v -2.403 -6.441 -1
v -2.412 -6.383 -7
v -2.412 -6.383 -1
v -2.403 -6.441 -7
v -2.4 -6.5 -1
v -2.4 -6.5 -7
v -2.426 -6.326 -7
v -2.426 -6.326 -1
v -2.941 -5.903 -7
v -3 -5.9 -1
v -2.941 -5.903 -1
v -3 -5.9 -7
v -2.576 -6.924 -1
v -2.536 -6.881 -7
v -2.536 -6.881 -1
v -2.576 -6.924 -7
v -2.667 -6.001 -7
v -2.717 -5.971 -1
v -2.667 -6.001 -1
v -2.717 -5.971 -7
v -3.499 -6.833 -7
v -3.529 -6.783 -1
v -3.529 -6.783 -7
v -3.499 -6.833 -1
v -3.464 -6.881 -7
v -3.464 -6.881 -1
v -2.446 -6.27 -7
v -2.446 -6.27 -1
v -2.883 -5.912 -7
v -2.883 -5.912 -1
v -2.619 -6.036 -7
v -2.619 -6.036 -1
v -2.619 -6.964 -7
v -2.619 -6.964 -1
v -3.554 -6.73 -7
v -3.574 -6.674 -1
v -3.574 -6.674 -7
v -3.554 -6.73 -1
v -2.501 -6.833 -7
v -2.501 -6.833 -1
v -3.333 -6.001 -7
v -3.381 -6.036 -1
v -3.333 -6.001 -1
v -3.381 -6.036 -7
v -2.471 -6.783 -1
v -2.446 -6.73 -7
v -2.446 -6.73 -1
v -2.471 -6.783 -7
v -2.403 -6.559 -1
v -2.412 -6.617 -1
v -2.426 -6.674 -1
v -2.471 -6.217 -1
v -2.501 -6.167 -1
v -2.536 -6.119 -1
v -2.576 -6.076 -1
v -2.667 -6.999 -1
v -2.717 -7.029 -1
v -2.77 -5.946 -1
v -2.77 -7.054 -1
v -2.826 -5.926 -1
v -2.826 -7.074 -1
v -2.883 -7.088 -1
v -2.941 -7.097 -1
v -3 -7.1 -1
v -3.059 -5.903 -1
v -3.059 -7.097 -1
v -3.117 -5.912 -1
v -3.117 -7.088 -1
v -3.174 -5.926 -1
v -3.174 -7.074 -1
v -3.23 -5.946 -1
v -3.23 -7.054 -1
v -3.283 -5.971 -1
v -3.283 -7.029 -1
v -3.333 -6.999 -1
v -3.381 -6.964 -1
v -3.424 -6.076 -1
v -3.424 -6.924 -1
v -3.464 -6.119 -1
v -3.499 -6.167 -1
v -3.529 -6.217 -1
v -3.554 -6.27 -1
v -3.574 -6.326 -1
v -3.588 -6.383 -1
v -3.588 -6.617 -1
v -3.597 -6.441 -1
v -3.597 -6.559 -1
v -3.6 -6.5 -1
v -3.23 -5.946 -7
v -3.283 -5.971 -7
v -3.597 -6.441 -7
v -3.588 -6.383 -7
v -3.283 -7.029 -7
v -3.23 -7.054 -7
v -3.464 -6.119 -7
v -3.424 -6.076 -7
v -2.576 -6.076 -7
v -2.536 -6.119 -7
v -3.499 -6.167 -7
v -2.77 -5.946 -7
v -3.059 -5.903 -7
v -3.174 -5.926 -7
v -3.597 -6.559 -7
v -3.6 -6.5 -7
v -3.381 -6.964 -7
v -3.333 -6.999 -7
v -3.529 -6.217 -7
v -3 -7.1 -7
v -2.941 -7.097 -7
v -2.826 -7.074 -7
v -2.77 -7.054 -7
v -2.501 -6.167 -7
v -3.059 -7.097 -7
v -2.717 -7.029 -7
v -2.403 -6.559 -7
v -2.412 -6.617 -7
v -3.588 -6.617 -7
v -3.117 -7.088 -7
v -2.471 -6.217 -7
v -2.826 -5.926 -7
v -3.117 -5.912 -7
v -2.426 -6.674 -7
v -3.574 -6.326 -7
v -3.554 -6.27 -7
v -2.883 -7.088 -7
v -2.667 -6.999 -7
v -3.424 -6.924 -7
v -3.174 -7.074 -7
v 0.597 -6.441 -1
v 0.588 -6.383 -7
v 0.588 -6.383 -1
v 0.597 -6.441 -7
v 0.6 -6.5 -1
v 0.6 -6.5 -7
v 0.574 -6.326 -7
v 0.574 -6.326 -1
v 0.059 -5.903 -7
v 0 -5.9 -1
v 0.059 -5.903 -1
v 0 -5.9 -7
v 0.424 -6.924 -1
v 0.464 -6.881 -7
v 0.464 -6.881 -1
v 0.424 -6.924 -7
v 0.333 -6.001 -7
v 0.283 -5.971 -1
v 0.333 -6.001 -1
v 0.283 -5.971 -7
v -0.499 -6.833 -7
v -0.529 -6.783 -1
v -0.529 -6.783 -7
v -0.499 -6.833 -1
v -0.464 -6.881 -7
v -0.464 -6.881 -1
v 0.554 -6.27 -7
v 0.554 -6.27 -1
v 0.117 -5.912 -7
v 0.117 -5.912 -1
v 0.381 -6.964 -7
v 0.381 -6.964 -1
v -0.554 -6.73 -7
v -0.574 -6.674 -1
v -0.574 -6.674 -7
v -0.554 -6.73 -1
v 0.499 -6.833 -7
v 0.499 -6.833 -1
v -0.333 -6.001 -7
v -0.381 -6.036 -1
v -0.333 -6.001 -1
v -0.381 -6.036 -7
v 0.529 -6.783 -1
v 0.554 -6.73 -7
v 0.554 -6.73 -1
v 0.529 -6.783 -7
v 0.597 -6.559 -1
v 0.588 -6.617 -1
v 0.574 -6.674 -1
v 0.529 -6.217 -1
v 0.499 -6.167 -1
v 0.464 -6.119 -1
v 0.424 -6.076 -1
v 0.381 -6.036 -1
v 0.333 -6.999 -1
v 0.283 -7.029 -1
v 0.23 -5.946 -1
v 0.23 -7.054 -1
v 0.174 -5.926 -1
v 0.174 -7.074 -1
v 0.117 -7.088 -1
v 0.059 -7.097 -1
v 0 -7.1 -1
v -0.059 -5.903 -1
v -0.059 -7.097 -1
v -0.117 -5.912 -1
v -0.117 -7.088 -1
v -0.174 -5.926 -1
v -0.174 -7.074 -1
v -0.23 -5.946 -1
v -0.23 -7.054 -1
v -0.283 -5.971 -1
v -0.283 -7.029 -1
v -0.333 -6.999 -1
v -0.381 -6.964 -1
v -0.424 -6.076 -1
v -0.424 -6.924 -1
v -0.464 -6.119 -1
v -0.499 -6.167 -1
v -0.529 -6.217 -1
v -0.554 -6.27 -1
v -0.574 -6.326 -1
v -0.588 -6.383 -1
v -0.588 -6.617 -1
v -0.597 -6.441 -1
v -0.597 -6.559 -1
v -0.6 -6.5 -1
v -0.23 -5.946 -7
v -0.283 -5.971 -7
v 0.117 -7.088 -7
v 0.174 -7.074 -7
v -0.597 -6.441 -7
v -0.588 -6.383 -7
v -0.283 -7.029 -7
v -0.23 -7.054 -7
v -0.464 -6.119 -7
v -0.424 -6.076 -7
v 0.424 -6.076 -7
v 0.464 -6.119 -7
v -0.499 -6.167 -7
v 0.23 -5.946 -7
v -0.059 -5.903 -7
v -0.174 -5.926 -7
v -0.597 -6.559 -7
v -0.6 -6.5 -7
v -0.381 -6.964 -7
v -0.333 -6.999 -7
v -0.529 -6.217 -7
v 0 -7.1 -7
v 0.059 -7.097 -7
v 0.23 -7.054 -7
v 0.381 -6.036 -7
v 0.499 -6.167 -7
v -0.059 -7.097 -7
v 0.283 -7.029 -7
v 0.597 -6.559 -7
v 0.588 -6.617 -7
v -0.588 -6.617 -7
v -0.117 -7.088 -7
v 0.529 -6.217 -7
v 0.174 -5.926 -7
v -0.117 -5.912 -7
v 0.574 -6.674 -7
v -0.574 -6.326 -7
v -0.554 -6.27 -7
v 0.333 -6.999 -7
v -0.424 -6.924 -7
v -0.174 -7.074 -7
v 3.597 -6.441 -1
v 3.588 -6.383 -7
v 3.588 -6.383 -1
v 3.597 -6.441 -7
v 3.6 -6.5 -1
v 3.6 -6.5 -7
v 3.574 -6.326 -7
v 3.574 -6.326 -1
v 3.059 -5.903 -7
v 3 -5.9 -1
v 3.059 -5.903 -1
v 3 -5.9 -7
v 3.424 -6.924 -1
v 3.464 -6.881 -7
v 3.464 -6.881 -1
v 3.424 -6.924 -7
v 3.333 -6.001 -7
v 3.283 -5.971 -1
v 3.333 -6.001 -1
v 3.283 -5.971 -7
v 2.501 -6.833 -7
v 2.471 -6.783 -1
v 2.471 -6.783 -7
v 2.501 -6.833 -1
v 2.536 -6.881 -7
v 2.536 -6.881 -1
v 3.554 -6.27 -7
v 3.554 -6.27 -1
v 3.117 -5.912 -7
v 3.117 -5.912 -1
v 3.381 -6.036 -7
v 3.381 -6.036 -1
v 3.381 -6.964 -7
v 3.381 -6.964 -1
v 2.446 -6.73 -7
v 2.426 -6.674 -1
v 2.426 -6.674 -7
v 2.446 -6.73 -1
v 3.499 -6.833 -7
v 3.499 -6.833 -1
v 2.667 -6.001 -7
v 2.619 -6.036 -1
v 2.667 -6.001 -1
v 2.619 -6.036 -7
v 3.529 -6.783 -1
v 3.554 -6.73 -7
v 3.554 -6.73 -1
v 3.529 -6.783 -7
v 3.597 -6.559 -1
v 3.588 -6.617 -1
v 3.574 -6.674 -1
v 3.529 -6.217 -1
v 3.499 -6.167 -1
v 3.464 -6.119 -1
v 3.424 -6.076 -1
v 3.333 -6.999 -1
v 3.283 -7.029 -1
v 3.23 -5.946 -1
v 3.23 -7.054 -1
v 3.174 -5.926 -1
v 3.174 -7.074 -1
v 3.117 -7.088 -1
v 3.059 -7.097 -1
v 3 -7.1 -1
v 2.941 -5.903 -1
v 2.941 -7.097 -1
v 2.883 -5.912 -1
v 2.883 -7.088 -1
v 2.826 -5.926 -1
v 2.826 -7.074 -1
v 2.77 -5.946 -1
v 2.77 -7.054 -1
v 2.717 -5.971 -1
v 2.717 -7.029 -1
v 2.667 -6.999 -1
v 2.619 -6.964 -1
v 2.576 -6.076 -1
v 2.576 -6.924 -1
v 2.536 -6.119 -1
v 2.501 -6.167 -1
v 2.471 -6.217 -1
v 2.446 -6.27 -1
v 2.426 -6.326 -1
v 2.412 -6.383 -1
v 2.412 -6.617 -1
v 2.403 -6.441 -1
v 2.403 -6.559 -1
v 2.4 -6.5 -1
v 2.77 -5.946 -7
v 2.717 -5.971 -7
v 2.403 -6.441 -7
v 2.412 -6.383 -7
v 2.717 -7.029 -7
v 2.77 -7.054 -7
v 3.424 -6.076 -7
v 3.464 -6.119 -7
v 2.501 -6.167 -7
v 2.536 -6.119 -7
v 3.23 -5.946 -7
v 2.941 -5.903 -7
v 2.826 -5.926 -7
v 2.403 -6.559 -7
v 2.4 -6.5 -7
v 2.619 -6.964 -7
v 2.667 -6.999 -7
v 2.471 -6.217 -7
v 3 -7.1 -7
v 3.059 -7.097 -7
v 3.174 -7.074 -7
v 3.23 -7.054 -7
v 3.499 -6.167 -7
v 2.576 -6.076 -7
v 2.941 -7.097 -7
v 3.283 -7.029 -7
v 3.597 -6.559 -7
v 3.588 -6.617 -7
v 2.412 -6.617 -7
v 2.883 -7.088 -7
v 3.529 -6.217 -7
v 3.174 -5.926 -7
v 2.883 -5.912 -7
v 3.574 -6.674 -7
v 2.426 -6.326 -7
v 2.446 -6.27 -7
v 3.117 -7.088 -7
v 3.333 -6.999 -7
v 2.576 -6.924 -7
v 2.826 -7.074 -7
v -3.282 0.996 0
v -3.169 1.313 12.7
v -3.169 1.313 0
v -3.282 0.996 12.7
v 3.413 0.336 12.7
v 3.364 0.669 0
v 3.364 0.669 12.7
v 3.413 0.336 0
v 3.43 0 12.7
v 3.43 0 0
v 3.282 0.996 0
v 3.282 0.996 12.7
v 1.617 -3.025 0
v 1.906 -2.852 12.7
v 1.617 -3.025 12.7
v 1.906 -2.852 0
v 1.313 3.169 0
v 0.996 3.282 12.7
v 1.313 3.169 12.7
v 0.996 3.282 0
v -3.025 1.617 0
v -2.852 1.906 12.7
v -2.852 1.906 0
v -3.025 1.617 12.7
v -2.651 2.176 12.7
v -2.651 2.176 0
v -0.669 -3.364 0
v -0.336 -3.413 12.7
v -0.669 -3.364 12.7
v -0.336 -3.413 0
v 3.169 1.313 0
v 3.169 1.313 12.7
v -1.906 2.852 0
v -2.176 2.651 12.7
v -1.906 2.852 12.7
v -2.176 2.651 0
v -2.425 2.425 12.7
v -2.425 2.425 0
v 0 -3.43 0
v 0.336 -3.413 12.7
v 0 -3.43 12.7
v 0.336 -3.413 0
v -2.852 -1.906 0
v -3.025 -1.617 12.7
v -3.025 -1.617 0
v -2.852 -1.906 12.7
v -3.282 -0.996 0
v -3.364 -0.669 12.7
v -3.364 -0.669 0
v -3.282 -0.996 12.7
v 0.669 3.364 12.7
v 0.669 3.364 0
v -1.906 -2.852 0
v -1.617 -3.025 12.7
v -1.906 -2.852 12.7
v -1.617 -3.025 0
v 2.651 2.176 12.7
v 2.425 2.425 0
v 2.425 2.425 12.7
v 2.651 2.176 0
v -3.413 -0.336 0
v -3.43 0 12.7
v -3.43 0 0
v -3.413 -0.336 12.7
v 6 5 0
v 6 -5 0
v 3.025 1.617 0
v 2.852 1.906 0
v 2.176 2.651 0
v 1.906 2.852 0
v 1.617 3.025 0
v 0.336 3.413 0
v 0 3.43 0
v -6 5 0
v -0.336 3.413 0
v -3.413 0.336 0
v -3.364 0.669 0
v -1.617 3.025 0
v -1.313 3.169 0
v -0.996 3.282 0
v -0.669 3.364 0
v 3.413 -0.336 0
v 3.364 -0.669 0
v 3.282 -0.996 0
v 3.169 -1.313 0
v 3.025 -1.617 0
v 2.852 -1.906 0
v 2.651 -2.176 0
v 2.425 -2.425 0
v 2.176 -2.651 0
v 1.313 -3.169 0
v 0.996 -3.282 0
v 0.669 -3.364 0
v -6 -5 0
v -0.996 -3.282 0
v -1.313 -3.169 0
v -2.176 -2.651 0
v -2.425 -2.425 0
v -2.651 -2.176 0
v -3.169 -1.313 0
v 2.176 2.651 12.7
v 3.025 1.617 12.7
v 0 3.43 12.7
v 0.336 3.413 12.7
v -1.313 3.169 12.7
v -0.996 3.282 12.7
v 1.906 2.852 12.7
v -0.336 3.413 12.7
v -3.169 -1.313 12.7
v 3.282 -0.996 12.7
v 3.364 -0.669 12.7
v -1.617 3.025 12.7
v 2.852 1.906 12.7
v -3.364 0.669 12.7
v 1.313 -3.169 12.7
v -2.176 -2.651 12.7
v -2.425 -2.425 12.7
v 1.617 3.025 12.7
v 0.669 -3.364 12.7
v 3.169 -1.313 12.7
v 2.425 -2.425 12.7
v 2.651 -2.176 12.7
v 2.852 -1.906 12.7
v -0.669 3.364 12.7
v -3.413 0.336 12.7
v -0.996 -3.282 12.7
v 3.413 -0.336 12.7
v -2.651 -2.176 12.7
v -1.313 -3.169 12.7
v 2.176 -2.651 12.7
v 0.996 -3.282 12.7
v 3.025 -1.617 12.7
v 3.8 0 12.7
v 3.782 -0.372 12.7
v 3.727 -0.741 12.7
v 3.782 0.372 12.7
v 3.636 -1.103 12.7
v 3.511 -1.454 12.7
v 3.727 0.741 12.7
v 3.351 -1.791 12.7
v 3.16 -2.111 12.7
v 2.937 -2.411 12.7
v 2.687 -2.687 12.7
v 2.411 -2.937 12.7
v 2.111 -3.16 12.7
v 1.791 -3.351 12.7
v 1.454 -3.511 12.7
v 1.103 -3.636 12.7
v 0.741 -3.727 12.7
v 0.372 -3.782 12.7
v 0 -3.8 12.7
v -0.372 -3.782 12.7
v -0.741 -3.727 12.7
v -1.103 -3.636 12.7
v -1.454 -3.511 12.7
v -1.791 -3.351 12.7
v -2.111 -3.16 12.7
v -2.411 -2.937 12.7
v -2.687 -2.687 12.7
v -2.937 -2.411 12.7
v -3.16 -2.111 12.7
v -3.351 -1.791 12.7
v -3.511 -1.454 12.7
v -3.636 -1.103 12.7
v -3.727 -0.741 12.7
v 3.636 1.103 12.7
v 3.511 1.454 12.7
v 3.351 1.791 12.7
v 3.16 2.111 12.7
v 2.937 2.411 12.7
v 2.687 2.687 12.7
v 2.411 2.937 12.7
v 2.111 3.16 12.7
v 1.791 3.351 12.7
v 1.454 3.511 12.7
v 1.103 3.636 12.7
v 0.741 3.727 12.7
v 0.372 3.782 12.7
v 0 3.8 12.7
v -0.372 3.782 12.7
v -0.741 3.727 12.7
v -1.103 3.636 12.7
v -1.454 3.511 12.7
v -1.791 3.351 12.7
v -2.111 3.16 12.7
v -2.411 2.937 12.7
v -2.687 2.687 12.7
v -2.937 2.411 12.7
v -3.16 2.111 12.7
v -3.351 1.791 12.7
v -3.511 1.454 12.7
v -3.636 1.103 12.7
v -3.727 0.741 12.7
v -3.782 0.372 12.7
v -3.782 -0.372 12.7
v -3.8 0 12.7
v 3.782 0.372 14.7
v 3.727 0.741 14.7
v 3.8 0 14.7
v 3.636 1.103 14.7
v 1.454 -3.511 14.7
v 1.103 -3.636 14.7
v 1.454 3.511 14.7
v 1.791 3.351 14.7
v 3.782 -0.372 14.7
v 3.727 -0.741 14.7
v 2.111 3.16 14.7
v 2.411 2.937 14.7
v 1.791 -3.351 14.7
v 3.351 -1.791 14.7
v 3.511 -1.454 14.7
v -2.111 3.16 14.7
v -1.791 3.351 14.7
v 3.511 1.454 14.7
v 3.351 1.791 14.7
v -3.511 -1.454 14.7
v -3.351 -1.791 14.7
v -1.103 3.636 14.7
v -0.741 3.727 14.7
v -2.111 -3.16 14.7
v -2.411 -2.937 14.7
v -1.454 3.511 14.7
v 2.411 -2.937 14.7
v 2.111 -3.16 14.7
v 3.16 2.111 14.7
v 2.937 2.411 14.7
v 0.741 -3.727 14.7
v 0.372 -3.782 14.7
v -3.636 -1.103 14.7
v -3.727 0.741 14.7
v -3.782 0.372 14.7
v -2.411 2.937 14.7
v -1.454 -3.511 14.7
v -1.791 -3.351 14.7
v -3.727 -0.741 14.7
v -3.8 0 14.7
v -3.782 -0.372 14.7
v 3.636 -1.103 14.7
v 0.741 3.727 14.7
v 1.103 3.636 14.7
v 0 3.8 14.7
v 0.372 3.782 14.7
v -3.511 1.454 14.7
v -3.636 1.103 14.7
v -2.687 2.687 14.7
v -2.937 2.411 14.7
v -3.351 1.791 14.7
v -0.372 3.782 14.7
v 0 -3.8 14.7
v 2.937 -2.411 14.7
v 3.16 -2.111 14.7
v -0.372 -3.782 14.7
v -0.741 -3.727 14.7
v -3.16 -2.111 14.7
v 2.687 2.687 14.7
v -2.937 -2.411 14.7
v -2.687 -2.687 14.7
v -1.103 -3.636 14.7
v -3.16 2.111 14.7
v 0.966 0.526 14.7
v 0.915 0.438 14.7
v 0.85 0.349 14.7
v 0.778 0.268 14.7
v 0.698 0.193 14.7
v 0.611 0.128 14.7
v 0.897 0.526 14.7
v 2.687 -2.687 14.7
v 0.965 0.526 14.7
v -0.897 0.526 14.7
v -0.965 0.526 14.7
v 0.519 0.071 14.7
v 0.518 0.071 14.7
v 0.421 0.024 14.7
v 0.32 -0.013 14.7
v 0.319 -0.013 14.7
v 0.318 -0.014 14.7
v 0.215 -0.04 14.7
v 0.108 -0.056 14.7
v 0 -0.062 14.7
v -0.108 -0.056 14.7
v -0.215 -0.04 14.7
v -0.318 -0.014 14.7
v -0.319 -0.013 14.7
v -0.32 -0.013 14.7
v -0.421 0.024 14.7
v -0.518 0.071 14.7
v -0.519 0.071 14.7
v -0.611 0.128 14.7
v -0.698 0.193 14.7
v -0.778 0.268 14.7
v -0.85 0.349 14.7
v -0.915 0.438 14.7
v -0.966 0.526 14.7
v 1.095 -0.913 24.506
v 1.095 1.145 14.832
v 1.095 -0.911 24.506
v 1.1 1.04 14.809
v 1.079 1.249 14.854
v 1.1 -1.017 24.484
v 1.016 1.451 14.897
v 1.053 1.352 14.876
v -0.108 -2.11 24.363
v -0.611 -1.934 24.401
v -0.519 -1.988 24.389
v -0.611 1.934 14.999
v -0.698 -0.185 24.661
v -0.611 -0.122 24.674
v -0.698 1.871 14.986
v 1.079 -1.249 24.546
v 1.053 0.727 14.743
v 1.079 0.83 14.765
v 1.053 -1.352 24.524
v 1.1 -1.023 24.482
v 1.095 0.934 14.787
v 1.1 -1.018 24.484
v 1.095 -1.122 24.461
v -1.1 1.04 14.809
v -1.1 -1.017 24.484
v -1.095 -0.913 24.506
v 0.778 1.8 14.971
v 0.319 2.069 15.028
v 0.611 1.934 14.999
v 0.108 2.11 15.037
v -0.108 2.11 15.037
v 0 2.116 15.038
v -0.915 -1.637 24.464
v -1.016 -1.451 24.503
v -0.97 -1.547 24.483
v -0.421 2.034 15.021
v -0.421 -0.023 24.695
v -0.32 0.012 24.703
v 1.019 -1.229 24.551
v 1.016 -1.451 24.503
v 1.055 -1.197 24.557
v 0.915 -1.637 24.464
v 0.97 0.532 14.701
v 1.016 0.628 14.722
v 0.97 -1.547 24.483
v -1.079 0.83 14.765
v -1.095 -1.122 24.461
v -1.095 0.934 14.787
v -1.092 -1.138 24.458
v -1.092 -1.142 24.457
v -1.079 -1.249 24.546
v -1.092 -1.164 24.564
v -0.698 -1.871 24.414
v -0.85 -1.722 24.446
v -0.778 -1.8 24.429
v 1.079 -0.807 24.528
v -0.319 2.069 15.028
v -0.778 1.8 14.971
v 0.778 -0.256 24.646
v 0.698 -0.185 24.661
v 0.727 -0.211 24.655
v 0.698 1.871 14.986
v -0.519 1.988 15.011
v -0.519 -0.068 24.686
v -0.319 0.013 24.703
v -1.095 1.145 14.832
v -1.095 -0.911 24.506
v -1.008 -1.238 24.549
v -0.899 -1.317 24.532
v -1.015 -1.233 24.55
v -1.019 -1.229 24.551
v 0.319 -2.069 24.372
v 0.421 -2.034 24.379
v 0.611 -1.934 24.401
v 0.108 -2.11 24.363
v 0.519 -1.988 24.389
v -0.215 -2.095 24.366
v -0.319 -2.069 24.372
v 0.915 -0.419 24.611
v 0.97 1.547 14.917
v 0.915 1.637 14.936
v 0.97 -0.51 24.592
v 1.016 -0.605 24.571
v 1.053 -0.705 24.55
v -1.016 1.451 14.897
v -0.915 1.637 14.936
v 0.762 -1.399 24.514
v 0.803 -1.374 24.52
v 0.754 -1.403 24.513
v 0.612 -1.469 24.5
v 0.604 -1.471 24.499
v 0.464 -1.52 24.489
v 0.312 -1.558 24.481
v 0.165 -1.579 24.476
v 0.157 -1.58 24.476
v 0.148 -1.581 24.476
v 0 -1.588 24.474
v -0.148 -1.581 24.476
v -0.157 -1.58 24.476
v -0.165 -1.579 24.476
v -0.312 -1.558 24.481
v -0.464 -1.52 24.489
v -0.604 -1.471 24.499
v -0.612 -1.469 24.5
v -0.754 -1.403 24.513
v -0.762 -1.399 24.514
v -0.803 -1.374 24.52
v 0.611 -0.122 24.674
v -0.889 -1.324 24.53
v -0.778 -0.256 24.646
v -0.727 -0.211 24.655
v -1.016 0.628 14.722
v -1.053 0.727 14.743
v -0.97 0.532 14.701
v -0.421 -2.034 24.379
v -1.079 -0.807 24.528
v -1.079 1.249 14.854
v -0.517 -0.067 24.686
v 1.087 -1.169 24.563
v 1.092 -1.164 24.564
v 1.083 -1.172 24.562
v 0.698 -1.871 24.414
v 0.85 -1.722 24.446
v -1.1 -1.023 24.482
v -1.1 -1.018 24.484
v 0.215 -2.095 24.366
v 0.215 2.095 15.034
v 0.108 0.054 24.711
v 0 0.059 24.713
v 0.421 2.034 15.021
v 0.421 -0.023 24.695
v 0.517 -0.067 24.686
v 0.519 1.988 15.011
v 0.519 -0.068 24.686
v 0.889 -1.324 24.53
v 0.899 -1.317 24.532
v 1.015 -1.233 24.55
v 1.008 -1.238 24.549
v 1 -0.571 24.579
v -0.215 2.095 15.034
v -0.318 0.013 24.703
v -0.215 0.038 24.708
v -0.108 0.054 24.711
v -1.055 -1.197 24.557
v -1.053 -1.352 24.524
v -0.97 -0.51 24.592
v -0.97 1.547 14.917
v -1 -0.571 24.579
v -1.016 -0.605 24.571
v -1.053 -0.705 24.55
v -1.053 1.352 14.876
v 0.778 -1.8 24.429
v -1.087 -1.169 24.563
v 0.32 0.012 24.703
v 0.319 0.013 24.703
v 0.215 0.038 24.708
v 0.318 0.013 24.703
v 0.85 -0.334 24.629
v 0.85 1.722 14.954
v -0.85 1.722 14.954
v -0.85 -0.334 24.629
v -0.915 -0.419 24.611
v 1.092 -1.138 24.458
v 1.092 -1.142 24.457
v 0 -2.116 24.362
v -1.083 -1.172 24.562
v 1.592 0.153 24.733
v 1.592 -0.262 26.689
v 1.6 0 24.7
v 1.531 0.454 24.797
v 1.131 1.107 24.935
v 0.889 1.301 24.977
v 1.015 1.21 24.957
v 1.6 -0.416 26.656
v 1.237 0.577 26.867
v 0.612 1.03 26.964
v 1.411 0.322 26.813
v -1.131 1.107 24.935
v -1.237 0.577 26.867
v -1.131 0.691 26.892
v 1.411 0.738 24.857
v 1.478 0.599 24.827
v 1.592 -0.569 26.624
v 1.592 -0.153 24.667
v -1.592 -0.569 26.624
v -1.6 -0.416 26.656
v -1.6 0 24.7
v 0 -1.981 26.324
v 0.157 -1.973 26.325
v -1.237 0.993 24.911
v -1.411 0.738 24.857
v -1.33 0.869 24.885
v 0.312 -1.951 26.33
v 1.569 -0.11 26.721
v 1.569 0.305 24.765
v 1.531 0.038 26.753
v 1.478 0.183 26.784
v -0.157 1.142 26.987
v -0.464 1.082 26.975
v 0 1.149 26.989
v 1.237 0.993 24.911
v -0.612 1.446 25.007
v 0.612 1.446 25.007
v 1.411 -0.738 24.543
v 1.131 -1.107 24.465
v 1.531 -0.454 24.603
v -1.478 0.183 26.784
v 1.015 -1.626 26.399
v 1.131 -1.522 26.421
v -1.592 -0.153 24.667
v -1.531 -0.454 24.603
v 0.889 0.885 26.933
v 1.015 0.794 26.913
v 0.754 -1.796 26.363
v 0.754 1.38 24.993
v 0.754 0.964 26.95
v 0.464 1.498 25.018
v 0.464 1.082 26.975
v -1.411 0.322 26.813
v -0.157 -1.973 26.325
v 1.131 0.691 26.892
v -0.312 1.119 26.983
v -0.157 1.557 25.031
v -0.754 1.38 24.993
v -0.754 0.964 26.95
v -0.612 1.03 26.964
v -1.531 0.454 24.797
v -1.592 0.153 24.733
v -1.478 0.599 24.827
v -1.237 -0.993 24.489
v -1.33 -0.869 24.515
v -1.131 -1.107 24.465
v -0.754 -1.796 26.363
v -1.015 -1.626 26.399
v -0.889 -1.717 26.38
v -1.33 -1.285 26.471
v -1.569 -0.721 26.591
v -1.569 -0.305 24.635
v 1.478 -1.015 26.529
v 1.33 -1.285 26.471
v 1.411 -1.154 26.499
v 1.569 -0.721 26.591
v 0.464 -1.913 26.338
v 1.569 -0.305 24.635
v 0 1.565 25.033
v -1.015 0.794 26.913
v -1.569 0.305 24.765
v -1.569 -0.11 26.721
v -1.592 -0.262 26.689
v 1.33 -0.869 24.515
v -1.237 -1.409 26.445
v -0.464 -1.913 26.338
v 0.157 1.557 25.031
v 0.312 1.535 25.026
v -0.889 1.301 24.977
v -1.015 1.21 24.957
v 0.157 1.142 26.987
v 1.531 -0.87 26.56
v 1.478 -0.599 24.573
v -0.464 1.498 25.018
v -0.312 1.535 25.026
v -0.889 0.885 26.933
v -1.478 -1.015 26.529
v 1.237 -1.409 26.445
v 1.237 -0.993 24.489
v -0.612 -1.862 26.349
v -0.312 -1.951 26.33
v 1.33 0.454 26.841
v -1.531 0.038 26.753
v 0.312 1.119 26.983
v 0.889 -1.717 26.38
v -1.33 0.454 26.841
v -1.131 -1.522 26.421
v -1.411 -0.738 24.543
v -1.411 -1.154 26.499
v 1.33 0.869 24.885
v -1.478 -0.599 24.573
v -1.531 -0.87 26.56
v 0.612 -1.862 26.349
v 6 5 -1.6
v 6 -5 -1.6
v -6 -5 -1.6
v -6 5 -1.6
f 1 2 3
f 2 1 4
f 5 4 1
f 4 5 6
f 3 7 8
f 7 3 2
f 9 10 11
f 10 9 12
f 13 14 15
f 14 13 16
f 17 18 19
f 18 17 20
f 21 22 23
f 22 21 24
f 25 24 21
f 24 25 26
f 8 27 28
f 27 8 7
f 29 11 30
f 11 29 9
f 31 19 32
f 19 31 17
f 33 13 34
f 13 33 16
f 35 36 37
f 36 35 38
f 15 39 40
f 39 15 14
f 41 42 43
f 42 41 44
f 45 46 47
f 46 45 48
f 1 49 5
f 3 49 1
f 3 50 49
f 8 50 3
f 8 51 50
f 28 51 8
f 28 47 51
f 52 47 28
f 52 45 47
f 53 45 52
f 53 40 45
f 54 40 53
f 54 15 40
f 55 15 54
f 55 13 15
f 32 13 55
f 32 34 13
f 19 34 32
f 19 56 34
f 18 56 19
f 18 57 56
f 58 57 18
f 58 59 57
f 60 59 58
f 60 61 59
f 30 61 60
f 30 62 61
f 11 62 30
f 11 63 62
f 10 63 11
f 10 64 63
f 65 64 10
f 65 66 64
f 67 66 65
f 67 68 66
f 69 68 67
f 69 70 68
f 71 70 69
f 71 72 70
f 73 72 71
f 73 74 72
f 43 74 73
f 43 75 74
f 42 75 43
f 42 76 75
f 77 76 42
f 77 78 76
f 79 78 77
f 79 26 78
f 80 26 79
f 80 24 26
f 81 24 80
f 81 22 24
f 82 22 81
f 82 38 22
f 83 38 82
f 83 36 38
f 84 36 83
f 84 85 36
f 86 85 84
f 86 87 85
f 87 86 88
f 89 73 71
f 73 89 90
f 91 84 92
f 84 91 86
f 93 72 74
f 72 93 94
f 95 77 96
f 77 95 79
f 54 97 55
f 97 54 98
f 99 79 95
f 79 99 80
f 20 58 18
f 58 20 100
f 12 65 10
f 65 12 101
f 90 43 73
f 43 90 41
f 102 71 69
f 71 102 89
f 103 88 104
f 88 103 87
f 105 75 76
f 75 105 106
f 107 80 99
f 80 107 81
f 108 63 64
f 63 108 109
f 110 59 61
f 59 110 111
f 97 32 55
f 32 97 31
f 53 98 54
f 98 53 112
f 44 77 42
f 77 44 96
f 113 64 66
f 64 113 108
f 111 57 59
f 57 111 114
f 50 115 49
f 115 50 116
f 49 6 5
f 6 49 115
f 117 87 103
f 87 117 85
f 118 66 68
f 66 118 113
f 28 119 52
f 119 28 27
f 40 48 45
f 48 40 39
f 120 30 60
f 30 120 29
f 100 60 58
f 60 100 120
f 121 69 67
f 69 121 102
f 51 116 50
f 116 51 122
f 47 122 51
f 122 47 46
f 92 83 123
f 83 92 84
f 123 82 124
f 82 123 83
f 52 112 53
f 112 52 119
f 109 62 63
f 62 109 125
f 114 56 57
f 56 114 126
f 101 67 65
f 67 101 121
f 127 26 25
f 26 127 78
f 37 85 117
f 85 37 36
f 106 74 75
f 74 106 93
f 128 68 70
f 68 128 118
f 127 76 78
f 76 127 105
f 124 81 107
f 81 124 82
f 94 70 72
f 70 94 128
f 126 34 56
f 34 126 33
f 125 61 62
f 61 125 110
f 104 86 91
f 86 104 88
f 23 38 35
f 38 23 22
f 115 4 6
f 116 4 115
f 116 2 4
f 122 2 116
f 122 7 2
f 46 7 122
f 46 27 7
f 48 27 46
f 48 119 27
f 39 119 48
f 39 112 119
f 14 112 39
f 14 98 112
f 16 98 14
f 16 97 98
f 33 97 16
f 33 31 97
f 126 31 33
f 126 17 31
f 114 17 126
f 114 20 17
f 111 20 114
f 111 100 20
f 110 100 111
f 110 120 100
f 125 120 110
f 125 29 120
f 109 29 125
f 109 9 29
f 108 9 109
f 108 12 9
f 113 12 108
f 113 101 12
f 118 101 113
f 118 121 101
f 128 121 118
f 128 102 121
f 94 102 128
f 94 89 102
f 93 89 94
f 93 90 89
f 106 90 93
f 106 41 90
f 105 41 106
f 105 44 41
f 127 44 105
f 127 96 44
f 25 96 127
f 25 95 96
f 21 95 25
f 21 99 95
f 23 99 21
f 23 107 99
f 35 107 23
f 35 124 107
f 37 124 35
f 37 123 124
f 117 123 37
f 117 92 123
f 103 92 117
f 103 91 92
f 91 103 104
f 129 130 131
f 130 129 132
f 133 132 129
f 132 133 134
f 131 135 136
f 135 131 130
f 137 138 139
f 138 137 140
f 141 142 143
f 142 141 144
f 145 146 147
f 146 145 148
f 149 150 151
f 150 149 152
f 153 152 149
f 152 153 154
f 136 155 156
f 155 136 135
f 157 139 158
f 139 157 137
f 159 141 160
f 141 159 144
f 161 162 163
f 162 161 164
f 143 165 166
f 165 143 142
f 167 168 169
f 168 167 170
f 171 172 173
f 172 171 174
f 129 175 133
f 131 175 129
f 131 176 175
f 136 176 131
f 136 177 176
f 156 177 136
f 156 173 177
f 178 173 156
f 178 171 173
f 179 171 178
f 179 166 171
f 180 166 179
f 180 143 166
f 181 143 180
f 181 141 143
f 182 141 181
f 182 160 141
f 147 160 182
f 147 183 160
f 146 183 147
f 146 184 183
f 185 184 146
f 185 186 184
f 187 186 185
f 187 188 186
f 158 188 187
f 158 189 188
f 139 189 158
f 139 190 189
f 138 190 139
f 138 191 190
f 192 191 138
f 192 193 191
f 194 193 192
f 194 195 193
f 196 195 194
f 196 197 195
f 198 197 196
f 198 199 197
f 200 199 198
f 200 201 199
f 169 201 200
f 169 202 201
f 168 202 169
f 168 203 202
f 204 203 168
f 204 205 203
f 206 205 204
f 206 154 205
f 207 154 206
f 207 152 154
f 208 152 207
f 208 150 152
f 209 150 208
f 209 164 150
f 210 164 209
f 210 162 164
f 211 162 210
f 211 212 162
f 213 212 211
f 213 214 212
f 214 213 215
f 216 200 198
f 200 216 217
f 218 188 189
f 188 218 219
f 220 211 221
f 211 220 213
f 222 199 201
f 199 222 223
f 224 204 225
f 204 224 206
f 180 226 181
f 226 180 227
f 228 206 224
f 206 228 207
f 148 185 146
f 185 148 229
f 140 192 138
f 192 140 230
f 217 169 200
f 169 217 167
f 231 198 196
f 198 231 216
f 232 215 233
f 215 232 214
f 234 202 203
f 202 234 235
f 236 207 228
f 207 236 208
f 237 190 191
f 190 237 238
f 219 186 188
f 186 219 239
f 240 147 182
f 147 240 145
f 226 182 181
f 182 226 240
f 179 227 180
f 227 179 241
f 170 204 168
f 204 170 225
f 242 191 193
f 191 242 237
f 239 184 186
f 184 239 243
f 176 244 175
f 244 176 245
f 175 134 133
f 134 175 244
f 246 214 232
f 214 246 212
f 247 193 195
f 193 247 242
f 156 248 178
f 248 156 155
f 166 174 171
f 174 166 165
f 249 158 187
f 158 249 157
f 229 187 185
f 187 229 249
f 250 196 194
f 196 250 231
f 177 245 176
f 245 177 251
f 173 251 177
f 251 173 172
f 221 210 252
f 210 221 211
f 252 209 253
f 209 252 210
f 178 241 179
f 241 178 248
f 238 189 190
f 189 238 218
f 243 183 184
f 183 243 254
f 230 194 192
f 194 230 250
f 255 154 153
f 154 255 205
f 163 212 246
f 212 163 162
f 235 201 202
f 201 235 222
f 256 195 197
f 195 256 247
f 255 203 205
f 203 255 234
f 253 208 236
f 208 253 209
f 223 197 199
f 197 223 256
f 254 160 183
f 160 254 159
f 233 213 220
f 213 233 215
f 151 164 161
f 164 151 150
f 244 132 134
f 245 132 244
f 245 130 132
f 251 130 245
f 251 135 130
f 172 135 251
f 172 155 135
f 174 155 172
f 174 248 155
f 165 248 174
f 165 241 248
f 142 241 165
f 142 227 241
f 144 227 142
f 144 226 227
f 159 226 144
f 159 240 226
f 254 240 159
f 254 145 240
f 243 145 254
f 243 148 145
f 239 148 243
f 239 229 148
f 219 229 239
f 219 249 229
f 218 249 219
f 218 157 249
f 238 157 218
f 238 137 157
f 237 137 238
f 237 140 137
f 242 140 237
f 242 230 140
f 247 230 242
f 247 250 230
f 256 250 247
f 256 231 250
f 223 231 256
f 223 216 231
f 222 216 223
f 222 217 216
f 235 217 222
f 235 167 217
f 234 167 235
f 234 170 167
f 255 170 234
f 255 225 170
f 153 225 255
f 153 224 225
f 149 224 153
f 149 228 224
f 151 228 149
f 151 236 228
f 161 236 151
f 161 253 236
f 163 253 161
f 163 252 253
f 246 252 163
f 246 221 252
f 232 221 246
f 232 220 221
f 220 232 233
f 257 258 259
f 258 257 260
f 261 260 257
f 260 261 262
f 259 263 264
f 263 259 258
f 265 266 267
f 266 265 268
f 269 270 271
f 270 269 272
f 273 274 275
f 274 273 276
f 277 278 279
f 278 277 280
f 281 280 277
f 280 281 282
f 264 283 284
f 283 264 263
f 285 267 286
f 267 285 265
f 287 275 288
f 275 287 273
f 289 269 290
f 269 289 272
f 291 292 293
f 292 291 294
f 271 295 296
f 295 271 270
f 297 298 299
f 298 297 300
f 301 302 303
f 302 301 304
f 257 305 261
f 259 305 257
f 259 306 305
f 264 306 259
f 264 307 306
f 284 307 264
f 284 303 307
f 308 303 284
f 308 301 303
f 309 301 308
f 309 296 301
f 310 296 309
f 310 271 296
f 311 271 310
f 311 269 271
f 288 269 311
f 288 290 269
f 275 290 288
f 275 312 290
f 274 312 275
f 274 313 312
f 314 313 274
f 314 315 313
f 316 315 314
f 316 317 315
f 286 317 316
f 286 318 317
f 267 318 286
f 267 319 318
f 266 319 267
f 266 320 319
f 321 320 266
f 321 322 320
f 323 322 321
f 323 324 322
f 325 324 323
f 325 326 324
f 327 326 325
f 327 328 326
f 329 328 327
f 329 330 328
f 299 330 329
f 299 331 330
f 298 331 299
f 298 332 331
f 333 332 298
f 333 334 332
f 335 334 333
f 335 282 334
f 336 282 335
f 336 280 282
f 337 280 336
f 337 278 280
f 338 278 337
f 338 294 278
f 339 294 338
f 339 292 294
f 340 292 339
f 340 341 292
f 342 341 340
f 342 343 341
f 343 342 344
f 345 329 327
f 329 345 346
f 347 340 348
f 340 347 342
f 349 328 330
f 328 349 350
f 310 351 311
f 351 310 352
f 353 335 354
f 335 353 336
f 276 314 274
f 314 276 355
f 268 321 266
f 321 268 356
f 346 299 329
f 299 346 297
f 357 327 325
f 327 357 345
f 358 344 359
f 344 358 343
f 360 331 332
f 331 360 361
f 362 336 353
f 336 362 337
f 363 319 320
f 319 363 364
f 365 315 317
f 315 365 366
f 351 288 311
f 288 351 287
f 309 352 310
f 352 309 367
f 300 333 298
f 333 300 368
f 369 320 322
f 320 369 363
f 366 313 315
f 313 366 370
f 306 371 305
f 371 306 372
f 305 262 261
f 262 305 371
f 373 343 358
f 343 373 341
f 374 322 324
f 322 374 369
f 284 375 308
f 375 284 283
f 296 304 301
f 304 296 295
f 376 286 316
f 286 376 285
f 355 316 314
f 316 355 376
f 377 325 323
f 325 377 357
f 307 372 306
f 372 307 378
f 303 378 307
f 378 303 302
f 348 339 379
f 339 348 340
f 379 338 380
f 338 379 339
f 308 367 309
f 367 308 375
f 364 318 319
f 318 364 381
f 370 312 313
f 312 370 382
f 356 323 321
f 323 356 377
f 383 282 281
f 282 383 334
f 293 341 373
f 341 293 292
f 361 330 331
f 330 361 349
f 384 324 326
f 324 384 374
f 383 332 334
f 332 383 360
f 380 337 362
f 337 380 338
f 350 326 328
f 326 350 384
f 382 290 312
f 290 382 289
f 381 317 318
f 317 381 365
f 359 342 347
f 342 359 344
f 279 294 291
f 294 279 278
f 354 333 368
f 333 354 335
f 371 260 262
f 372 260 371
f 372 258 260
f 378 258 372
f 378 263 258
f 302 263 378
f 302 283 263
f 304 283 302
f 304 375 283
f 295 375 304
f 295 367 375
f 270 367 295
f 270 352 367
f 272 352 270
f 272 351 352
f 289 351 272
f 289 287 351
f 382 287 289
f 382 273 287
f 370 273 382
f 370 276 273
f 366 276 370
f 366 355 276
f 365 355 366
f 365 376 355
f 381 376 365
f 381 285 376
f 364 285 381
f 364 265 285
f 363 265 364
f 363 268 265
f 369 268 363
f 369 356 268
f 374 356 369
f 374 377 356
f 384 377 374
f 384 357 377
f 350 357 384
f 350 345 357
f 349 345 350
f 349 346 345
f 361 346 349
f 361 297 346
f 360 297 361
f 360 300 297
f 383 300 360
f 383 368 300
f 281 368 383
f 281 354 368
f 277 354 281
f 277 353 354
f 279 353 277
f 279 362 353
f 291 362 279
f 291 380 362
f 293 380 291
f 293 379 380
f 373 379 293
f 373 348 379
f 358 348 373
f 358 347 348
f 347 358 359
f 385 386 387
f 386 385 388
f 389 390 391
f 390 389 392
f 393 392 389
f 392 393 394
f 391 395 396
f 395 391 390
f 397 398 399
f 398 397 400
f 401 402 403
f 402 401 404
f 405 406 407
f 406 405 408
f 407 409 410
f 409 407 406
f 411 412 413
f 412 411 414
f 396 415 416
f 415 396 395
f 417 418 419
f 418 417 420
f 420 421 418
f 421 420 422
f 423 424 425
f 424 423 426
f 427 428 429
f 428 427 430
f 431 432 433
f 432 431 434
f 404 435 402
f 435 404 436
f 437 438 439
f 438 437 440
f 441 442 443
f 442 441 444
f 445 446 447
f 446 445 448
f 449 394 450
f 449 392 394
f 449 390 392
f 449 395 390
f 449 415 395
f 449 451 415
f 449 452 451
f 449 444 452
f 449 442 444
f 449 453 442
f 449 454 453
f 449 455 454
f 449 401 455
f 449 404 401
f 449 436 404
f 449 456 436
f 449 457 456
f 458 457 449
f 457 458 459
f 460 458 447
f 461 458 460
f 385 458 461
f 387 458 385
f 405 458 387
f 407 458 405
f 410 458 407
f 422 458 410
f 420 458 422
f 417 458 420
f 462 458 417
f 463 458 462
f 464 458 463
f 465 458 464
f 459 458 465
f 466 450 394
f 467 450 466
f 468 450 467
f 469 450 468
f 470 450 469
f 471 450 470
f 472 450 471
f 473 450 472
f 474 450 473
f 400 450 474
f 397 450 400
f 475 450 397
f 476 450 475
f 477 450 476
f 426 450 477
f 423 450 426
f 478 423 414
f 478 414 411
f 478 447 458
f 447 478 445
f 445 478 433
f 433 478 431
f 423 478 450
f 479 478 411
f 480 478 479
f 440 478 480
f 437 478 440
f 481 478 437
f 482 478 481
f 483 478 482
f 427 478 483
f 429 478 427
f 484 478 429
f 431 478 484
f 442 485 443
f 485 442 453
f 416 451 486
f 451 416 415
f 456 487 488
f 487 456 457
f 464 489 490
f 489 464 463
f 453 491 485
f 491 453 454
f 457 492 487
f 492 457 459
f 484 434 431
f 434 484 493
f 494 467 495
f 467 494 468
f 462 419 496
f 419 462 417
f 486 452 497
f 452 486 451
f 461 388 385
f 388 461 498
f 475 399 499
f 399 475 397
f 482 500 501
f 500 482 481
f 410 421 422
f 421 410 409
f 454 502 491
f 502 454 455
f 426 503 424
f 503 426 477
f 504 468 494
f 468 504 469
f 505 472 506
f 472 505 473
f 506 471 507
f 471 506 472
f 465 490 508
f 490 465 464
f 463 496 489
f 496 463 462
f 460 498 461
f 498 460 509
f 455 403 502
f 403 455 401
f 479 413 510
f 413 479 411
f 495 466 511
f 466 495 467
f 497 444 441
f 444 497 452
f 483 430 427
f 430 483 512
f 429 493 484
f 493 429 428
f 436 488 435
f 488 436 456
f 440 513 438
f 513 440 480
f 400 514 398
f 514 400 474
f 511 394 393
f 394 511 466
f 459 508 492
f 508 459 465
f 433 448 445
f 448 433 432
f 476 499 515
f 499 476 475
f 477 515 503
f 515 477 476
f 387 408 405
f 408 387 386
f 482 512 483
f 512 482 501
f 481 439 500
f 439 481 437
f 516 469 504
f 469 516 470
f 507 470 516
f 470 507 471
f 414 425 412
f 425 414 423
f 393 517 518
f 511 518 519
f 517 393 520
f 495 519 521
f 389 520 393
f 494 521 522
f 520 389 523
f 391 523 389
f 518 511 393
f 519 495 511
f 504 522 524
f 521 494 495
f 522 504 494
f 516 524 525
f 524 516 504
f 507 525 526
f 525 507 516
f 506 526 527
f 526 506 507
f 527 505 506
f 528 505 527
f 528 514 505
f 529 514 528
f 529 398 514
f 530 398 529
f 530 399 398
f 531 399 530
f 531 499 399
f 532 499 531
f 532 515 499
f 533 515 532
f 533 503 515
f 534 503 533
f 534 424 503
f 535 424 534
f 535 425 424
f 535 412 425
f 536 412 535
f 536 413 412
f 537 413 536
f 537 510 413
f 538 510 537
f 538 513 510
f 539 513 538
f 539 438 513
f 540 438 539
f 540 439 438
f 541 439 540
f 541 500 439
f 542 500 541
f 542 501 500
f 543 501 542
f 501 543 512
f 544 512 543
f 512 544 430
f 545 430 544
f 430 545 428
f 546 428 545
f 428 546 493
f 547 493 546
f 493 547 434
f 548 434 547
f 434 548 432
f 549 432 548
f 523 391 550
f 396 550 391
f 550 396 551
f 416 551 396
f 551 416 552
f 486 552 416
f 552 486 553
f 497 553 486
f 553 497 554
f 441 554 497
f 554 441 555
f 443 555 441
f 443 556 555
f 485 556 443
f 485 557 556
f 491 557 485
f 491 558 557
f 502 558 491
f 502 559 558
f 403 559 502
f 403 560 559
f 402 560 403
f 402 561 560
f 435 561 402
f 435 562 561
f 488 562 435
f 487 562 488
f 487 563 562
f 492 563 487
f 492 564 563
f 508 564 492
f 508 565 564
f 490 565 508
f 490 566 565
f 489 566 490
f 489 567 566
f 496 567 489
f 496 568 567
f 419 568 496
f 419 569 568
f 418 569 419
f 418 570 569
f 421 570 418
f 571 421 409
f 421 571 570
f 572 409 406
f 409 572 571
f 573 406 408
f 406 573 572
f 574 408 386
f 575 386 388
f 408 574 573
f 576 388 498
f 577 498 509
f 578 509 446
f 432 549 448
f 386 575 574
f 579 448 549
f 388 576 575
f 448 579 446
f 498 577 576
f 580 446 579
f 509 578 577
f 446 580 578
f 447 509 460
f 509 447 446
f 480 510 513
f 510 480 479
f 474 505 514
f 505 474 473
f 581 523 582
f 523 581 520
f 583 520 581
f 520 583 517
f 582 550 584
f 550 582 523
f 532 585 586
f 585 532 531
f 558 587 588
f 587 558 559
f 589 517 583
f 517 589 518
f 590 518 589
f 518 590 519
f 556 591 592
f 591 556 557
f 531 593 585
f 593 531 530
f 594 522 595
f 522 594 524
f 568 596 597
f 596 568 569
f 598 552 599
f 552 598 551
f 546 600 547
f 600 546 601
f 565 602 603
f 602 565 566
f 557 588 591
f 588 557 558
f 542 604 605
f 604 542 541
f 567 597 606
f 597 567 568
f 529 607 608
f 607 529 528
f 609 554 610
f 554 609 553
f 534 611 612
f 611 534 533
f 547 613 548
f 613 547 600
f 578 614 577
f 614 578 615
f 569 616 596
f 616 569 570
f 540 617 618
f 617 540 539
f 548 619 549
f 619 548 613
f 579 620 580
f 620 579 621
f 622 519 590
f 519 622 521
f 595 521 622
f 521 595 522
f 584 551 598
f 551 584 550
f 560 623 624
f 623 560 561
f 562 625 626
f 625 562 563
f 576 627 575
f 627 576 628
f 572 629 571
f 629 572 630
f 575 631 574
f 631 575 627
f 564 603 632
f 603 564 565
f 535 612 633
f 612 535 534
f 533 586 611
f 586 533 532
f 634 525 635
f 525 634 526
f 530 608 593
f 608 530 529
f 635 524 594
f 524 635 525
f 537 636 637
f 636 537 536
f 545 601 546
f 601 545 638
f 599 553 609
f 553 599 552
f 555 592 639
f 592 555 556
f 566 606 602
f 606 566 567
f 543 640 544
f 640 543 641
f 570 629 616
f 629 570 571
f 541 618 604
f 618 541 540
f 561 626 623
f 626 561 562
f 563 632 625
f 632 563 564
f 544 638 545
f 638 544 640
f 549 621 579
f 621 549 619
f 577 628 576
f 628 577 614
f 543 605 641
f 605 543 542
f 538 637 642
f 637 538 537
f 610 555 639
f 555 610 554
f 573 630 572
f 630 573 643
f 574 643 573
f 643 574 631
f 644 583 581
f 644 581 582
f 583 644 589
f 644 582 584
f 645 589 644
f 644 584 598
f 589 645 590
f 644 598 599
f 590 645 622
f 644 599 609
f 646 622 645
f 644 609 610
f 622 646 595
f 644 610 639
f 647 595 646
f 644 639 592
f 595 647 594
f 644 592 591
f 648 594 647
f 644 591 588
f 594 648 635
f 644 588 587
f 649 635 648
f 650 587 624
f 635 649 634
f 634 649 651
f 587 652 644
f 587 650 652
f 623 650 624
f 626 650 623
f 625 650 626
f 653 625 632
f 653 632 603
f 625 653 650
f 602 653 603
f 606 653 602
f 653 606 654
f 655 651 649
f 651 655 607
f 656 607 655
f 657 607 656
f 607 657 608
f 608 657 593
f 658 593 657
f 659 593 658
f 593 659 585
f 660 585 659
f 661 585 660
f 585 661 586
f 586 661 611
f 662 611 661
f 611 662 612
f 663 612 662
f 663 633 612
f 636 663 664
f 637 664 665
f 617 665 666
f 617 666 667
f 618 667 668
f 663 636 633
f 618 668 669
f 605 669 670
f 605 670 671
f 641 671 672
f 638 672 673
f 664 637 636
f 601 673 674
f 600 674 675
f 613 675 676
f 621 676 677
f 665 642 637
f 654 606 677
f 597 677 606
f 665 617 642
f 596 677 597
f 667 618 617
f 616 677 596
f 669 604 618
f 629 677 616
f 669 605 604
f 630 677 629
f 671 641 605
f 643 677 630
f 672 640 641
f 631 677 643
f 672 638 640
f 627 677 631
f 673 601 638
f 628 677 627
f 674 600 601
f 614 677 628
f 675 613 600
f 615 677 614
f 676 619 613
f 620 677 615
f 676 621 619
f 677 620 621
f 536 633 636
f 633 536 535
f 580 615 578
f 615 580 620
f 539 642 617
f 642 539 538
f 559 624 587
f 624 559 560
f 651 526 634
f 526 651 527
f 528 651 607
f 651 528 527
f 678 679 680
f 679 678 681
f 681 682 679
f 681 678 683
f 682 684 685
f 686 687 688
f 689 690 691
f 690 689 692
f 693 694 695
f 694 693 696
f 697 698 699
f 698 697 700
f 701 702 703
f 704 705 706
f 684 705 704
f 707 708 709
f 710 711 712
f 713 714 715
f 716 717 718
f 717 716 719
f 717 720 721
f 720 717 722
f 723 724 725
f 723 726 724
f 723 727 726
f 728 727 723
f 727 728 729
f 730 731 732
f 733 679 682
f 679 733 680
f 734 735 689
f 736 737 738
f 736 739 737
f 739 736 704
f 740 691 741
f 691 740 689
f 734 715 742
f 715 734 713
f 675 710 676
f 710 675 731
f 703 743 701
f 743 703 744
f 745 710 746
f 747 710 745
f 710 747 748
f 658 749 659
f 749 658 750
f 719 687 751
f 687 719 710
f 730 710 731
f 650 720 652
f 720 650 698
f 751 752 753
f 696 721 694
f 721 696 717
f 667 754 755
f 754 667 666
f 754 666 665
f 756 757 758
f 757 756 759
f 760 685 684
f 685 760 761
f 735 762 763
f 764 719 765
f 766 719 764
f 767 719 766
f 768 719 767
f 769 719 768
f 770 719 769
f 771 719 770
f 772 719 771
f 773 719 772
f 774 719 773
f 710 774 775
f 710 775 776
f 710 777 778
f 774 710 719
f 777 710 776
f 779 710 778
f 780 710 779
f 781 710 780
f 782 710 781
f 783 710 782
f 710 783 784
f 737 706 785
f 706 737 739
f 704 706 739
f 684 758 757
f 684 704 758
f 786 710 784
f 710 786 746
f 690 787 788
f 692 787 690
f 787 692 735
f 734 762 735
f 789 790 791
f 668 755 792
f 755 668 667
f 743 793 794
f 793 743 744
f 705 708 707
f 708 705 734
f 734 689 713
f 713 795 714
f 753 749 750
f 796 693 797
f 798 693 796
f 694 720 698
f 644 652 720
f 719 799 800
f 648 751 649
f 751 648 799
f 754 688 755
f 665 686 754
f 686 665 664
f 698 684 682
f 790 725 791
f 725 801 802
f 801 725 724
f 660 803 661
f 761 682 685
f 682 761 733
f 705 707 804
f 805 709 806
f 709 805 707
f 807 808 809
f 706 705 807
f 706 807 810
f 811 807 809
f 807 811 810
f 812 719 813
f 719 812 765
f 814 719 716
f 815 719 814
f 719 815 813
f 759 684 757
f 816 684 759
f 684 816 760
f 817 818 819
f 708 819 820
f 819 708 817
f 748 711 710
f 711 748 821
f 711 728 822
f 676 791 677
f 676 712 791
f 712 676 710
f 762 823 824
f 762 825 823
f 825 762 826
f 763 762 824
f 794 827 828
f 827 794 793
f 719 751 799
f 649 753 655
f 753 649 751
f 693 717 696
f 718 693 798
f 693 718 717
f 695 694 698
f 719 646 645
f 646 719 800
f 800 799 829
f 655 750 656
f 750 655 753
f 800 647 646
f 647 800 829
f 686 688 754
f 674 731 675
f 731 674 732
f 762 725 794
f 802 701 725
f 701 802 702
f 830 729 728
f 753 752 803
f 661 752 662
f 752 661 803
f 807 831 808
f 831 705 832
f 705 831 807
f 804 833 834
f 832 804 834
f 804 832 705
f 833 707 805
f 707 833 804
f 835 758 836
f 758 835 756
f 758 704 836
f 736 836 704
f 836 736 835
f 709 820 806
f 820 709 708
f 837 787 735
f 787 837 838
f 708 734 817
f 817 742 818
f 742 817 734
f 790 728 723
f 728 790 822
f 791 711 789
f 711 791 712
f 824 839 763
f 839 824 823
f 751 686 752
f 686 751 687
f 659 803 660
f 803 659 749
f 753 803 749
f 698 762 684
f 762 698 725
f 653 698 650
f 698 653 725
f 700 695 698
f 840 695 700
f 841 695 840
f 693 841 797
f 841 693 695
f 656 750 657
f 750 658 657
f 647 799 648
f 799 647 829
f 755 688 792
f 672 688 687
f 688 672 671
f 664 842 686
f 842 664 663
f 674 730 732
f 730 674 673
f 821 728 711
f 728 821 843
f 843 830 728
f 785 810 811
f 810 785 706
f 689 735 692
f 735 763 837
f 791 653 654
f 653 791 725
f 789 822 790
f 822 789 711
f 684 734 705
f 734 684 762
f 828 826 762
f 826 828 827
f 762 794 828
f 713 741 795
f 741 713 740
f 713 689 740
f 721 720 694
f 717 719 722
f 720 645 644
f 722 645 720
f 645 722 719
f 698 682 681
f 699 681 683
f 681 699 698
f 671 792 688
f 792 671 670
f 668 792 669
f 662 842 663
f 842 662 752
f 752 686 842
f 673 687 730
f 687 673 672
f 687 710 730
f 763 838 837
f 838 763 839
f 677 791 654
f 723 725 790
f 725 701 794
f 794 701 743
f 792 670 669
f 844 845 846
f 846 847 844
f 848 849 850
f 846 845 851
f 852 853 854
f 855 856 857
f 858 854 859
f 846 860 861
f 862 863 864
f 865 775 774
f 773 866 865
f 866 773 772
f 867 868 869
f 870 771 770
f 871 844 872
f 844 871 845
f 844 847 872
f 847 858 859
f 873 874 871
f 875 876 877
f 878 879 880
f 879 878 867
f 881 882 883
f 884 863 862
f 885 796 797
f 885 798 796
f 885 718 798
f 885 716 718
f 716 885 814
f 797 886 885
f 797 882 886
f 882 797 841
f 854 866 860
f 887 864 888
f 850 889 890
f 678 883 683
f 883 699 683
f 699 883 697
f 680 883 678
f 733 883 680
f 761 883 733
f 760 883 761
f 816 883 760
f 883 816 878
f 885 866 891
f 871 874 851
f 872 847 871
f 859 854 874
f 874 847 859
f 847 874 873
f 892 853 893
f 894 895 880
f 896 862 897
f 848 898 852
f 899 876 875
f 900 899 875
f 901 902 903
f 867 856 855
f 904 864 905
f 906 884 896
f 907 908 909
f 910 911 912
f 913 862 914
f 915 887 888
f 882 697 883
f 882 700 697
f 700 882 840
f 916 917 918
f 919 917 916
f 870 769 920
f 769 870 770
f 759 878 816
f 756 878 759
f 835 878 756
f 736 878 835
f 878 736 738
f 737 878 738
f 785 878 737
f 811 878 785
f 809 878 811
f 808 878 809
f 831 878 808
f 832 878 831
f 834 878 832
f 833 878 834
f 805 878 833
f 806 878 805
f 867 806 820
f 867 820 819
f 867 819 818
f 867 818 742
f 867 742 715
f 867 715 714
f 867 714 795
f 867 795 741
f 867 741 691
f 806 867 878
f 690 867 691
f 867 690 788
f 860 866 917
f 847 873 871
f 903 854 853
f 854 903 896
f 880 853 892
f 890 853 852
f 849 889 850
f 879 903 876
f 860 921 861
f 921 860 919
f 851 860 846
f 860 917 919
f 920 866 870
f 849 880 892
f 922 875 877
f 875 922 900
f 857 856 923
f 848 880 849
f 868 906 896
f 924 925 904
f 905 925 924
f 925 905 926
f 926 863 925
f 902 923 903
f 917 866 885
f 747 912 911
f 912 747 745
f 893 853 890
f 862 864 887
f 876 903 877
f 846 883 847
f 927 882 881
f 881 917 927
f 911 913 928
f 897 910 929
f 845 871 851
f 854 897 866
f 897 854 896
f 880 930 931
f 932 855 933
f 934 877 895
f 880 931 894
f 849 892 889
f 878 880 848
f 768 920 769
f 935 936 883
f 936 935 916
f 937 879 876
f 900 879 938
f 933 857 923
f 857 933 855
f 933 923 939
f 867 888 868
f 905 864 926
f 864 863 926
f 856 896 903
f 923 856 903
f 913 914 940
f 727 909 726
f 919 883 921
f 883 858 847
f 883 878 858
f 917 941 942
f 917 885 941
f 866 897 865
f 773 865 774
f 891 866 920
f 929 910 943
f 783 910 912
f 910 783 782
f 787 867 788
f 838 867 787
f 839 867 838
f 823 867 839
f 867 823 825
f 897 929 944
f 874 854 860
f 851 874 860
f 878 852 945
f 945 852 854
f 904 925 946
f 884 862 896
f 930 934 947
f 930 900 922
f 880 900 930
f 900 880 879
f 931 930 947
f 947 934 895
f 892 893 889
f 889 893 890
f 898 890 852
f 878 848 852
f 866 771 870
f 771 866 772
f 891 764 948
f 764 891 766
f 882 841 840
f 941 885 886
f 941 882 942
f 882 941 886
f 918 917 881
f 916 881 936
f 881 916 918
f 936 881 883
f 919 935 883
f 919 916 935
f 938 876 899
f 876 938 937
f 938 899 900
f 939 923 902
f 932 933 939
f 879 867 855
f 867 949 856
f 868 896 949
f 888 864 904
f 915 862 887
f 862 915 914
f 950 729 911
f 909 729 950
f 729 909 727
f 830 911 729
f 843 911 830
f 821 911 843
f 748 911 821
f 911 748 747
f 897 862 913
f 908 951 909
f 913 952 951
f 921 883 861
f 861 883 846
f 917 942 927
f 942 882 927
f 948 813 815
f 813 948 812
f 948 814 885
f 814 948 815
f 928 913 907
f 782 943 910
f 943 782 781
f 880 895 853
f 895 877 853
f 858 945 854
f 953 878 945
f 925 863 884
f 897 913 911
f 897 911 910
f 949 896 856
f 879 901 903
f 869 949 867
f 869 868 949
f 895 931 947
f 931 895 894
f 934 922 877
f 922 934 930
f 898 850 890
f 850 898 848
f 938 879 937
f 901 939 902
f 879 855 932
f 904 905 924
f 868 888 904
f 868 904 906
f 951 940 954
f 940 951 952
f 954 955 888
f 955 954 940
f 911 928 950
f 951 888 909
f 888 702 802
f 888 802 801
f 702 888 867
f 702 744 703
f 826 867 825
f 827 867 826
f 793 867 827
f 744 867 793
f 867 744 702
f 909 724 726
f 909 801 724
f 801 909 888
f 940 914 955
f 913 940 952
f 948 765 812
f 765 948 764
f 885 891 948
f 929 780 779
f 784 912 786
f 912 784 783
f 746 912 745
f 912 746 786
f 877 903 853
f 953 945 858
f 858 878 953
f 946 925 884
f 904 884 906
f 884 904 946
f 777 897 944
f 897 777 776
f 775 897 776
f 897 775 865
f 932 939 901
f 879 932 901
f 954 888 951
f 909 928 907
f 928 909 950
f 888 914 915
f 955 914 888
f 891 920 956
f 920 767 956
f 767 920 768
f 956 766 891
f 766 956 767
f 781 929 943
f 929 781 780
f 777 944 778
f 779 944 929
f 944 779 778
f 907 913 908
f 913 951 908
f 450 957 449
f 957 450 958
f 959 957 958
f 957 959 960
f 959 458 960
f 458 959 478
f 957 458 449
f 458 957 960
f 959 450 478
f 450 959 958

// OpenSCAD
$fn=64;

body_d = 6.86;
body_r = body_d/2;
body_h = 12.7;

bushing_d = 7.6;
bushing_h = 2.0;

lever_d = 2.2;
lever_h = 10.0;

tip_d = 3.2;
tip_h = 2.0;

base_plate_w = 12.0;
base_plate_d = 10.0;
base_plate_h = 1.6;

module toggle_switch() {
    union() {
        translate([0,0,body_h/2])
            cylinder(d=body_d, h=body_h, center=true);

        translate([0,0,body_h + bushing_h/2])
            cylinder(d=bushing_d, h=bushing_h, center=true);

        translate([0,0,body_h + bushing_h + lever_h/2])
            rotate([12,0,0])
                cylinder(d=lever_d, h=lever_h, center=true);

        translate([0,0,body_h + bushing_h + lever_h])
            rotate([12,0,0])
                translate([0,0,tip_h/2])
                    cylinder(d=tip_d, h=tip_h, center=true);

        translate([0,0,-base_plate_h/2])
            cube([base_plate_w, base_plate_d, base_plate_h], center=true);

        for (x = [-3.0, 0, 3.0]) {
            translate([x, -base_plate_d/2 - 1.5, -4.0])
                cylinder(d=1.2, h=6.0, center=true);
        }
    }
}

toggle_switch();
